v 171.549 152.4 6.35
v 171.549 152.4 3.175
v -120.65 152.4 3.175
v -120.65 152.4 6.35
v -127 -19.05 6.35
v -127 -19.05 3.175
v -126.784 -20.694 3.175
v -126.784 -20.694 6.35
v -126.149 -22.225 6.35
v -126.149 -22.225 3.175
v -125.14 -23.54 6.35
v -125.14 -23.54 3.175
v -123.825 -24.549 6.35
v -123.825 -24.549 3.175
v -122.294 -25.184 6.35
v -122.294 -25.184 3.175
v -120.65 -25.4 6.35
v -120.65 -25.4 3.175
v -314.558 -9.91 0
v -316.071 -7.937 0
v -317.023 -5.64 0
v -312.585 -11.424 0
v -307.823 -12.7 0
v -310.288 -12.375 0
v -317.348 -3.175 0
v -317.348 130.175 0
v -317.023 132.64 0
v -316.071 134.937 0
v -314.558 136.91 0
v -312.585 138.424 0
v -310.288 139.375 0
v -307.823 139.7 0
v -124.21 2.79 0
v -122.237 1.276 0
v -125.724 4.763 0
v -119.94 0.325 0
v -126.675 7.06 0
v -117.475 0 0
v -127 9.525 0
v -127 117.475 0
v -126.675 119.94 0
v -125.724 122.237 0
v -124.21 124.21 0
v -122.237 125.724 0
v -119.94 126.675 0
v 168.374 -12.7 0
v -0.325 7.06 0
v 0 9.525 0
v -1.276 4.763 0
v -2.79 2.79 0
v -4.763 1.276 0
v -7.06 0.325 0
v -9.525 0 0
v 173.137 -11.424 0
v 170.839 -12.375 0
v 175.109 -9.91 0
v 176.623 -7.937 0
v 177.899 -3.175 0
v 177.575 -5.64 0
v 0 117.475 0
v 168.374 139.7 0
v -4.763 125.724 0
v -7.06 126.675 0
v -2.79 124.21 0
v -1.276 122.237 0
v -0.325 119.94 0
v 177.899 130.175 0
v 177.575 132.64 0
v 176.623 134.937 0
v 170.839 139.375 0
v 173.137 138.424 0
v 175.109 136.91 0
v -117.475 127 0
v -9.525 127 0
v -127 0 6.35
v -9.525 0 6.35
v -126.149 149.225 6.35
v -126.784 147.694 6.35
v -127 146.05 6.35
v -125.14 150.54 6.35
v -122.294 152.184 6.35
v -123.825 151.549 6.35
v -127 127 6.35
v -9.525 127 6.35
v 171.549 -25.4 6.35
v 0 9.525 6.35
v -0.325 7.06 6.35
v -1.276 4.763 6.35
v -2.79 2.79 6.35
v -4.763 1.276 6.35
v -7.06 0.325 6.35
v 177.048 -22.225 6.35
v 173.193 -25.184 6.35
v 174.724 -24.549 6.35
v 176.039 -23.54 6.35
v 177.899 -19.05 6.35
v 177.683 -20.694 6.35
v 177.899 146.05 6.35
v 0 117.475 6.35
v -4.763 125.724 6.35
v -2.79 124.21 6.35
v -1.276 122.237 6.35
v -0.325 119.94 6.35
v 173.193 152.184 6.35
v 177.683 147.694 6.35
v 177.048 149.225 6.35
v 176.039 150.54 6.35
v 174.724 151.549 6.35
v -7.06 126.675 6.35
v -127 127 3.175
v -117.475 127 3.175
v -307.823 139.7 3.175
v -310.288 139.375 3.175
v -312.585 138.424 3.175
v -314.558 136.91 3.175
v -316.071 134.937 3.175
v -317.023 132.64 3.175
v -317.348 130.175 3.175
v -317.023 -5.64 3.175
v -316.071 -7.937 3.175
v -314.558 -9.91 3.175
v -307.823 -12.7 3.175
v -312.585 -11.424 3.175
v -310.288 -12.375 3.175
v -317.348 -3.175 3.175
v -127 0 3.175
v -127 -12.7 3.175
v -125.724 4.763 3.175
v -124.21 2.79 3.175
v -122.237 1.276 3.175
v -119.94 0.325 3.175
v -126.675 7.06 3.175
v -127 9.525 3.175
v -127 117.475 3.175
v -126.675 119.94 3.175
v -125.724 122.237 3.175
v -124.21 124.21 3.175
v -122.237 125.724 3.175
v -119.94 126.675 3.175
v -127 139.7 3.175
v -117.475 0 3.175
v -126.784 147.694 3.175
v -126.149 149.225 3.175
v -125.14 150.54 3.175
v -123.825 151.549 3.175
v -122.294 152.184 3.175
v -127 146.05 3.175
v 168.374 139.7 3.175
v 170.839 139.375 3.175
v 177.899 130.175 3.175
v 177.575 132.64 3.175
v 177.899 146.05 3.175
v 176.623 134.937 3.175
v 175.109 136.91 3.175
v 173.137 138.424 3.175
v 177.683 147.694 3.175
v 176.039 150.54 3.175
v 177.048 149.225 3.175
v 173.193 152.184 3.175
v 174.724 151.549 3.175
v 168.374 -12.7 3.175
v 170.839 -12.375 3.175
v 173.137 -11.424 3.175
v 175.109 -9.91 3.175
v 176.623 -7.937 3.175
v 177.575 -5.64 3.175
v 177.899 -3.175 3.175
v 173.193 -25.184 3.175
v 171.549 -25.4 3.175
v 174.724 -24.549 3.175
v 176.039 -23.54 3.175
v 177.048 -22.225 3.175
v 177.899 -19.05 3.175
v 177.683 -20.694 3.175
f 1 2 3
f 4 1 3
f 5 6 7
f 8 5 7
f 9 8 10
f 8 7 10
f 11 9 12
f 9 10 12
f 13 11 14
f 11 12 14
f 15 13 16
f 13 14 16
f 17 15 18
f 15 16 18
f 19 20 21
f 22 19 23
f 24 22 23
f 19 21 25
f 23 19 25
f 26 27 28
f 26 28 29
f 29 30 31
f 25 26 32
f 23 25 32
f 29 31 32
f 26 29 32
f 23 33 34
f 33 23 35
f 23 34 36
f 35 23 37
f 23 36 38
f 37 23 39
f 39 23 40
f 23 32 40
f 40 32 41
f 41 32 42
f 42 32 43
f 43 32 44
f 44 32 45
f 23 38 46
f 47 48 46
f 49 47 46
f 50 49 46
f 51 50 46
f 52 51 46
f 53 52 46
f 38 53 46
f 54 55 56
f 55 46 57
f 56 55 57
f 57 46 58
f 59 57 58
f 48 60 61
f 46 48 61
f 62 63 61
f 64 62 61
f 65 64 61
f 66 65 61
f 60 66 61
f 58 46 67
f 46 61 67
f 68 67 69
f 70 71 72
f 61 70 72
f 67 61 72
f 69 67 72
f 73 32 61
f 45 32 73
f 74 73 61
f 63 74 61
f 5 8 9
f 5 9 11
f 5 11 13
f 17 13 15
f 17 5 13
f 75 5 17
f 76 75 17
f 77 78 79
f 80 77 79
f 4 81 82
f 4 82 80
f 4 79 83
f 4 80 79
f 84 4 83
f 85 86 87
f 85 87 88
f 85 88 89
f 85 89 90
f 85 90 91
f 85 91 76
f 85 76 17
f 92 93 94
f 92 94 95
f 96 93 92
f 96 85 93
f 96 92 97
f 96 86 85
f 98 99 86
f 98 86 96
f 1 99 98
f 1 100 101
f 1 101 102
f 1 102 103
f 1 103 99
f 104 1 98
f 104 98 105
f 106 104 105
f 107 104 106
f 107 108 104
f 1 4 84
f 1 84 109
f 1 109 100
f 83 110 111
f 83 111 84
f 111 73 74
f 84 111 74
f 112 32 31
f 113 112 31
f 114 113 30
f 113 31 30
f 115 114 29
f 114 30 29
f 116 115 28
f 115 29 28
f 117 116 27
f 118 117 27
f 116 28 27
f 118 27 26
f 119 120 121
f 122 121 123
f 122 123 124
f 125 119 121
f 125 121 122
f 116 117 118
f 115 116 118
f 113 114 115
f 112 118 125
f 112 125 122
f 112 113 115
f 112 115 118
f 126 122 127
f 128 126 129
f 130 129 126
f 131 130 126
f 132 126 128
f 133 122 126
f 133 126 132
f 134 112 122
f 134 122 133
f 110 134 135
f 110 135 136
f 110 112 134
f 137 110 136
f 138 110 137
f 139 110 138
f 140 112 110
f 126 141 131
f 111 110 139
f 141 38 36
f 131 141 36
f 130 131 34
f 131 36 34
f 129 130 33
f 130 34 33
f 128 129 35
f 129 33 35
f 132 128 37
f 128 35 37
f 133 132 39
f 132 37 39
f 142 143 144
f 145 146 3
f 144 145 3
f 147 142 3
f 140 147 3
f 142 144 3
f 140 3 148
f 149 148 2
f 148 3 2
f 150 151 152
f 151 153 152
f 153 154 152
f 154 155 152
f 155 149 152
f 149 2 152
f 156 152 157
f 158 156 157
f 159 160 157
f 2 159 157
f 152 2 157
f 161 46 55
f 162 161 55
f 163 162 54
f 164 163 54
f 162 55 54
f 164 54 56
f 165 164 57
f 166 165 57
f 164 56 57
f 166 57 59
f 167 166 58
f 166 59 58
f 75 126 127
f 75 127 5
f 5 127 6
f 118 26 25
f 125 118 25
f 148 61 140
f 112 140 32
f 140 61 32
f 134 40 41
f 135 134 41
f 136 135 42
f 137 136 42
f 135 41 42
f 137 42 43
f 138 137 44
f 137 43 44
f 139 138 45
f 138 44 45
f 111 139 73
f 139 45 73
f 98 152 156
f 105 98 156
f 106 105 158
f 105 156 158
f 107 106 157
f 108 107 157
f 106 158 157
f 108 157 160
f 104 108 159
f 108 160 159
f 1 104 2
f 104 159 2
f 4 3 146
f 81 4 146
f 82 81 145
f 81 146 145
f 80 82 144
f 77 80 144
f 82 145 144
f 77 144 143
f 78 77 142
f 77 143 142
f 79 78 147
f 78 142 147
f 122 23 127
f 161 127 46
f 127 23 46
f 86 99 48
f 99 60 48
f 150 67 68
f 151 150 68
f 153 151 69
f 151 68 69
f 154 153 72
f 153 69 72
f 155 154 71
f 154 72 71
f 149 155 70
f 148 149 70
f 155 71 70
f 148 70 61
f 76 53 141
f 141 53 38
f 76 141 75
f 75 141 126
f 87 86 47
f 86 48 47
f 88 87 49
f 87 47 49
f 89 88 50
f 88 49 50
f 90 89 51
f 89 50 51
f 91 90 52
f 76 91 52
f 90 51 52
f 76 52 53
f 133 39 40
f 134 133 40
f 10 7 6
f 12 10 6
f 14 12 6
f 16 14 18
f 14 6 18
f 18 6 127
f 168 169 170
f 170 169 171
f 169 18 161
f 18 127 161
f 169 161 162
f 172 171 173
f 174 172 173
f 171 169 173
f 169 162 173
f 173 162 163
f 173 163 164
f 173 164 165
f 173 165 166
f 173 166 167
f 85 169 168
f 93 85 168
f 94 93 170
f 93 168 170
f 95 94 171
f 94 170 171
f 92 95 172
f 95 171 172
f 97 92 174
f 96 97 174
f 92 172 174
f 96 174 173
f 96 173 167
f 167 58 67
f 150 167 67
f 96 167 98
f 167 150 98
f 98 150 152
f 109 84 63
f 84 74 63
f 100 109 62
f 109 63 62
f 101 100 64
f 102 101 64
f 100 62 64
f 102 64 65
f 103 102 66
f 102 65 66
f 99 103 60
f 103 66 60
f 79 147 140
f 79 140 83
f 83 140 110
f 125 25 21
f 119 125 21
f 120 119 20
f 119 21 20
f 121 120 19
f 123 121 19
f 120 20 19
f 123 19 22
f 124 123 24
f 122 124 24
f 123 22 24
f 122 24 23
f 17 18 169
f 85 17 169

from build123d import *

# Parameters (mm, degrees)
F1_DEPTH = 3.175
F3_DEPTH = 3.175


with BuildPart() as f1:
    # F0 (on Top) → F1 (new body)
    with BuildSketch(Plane.XY):
        with BuildLine():
            Line((168.37406, 139.7), (-307.8226, 139.7))
            ThreePointArc((-307.8226, 139.7), (-314.557792, 136.910192), (-317.3476, 130.175))
            Line((-317.3476, 130.175), (-317.3476, -3.175))
            ThreePointArc((-317.3476, -3.175), (-314.557792, -9.910192), (-307.8226, -12.7))
            Line((-307.8226, -12.7), (168.37406, -12.7))
            ThreePointArc((168.37406, -12.7), (175.109252, -9.910192), (177.89906, -3.175))
            Line((177.89906, -3.175), (177.89906, 130.175))
            ThreePointArc((177.89906, 130.175), (175.109252, 136.910192), (168.37406, 139.7))
        make_face()
        with BuildLine():
            ThreePointArc((0, 9.525), (-2.789808, 2.789808), (-9.525, 0))
            Line((-9.525, 0), (-117.475, 0))
            ThreePointArc((-117.475, 0), (-124.210192, 2.789808), (-127, 9.525))
            Line((-127, 9.525), (-127, 117.475))
            ThreePointArc((-127, 117.475), (-124.210192, 124.210192), (-117.475, 127))
            Line((-117.475, 127), (-9.525, 127))
            ThreePointArc((-9.525, 127), (-2.789808, 124.210192), (0, 117.475))
            Line((0, 117.475), (0, 9.525))
        make_face(mode=Mode.SUBTRACT)
    extrude(amount=F1_DEPTH)

    # F2 (on face) → F3 (join)
    with BuildSketch(Plane.XY.offset(3.175)):
        with BuildLine():
            Line((171.54906, 152.4), (-120.65, 152.4))
            ThreePointArc((-120.65, 152.4), (-125.140128, 150.540128), (-127, 146.05))
            Line((-127, 146.05), (-127, 127))
            Line((-127, 127), (-9.525, 127))
            ThreePointArc((-9.525, 127), (-2.789808, 124.210192), (0, 117.475))
            Line((0, 117.475), (0, 9.525))
            ThreePointArc((0, 9.525), (-2.789808, 2.789808), (-9.525, 0))
            Line((-9.525, 0), (-127, 0))
            Line((-127, 0), (-127, -19.05))
            ThreePointArc((-127, -19.05), (-125.140128, -23.540128), (-120.65, -25.4))
            Line((-120.65, -25.4), (171.54906, -25.4))
            ThreePointArc((171.54906, -25.4), (176.039188, -23.540128), (177.89906, -19.05))
            Line((177.89906, -19.05), (177.89906, 146.05))
            ThreePointArc((177.89906, 146.05), (176.039188, 150.540128), (171.54906, 152.4))
        make_face()
    extrude(amount=F3_DEPTH)


solid = f1.part
